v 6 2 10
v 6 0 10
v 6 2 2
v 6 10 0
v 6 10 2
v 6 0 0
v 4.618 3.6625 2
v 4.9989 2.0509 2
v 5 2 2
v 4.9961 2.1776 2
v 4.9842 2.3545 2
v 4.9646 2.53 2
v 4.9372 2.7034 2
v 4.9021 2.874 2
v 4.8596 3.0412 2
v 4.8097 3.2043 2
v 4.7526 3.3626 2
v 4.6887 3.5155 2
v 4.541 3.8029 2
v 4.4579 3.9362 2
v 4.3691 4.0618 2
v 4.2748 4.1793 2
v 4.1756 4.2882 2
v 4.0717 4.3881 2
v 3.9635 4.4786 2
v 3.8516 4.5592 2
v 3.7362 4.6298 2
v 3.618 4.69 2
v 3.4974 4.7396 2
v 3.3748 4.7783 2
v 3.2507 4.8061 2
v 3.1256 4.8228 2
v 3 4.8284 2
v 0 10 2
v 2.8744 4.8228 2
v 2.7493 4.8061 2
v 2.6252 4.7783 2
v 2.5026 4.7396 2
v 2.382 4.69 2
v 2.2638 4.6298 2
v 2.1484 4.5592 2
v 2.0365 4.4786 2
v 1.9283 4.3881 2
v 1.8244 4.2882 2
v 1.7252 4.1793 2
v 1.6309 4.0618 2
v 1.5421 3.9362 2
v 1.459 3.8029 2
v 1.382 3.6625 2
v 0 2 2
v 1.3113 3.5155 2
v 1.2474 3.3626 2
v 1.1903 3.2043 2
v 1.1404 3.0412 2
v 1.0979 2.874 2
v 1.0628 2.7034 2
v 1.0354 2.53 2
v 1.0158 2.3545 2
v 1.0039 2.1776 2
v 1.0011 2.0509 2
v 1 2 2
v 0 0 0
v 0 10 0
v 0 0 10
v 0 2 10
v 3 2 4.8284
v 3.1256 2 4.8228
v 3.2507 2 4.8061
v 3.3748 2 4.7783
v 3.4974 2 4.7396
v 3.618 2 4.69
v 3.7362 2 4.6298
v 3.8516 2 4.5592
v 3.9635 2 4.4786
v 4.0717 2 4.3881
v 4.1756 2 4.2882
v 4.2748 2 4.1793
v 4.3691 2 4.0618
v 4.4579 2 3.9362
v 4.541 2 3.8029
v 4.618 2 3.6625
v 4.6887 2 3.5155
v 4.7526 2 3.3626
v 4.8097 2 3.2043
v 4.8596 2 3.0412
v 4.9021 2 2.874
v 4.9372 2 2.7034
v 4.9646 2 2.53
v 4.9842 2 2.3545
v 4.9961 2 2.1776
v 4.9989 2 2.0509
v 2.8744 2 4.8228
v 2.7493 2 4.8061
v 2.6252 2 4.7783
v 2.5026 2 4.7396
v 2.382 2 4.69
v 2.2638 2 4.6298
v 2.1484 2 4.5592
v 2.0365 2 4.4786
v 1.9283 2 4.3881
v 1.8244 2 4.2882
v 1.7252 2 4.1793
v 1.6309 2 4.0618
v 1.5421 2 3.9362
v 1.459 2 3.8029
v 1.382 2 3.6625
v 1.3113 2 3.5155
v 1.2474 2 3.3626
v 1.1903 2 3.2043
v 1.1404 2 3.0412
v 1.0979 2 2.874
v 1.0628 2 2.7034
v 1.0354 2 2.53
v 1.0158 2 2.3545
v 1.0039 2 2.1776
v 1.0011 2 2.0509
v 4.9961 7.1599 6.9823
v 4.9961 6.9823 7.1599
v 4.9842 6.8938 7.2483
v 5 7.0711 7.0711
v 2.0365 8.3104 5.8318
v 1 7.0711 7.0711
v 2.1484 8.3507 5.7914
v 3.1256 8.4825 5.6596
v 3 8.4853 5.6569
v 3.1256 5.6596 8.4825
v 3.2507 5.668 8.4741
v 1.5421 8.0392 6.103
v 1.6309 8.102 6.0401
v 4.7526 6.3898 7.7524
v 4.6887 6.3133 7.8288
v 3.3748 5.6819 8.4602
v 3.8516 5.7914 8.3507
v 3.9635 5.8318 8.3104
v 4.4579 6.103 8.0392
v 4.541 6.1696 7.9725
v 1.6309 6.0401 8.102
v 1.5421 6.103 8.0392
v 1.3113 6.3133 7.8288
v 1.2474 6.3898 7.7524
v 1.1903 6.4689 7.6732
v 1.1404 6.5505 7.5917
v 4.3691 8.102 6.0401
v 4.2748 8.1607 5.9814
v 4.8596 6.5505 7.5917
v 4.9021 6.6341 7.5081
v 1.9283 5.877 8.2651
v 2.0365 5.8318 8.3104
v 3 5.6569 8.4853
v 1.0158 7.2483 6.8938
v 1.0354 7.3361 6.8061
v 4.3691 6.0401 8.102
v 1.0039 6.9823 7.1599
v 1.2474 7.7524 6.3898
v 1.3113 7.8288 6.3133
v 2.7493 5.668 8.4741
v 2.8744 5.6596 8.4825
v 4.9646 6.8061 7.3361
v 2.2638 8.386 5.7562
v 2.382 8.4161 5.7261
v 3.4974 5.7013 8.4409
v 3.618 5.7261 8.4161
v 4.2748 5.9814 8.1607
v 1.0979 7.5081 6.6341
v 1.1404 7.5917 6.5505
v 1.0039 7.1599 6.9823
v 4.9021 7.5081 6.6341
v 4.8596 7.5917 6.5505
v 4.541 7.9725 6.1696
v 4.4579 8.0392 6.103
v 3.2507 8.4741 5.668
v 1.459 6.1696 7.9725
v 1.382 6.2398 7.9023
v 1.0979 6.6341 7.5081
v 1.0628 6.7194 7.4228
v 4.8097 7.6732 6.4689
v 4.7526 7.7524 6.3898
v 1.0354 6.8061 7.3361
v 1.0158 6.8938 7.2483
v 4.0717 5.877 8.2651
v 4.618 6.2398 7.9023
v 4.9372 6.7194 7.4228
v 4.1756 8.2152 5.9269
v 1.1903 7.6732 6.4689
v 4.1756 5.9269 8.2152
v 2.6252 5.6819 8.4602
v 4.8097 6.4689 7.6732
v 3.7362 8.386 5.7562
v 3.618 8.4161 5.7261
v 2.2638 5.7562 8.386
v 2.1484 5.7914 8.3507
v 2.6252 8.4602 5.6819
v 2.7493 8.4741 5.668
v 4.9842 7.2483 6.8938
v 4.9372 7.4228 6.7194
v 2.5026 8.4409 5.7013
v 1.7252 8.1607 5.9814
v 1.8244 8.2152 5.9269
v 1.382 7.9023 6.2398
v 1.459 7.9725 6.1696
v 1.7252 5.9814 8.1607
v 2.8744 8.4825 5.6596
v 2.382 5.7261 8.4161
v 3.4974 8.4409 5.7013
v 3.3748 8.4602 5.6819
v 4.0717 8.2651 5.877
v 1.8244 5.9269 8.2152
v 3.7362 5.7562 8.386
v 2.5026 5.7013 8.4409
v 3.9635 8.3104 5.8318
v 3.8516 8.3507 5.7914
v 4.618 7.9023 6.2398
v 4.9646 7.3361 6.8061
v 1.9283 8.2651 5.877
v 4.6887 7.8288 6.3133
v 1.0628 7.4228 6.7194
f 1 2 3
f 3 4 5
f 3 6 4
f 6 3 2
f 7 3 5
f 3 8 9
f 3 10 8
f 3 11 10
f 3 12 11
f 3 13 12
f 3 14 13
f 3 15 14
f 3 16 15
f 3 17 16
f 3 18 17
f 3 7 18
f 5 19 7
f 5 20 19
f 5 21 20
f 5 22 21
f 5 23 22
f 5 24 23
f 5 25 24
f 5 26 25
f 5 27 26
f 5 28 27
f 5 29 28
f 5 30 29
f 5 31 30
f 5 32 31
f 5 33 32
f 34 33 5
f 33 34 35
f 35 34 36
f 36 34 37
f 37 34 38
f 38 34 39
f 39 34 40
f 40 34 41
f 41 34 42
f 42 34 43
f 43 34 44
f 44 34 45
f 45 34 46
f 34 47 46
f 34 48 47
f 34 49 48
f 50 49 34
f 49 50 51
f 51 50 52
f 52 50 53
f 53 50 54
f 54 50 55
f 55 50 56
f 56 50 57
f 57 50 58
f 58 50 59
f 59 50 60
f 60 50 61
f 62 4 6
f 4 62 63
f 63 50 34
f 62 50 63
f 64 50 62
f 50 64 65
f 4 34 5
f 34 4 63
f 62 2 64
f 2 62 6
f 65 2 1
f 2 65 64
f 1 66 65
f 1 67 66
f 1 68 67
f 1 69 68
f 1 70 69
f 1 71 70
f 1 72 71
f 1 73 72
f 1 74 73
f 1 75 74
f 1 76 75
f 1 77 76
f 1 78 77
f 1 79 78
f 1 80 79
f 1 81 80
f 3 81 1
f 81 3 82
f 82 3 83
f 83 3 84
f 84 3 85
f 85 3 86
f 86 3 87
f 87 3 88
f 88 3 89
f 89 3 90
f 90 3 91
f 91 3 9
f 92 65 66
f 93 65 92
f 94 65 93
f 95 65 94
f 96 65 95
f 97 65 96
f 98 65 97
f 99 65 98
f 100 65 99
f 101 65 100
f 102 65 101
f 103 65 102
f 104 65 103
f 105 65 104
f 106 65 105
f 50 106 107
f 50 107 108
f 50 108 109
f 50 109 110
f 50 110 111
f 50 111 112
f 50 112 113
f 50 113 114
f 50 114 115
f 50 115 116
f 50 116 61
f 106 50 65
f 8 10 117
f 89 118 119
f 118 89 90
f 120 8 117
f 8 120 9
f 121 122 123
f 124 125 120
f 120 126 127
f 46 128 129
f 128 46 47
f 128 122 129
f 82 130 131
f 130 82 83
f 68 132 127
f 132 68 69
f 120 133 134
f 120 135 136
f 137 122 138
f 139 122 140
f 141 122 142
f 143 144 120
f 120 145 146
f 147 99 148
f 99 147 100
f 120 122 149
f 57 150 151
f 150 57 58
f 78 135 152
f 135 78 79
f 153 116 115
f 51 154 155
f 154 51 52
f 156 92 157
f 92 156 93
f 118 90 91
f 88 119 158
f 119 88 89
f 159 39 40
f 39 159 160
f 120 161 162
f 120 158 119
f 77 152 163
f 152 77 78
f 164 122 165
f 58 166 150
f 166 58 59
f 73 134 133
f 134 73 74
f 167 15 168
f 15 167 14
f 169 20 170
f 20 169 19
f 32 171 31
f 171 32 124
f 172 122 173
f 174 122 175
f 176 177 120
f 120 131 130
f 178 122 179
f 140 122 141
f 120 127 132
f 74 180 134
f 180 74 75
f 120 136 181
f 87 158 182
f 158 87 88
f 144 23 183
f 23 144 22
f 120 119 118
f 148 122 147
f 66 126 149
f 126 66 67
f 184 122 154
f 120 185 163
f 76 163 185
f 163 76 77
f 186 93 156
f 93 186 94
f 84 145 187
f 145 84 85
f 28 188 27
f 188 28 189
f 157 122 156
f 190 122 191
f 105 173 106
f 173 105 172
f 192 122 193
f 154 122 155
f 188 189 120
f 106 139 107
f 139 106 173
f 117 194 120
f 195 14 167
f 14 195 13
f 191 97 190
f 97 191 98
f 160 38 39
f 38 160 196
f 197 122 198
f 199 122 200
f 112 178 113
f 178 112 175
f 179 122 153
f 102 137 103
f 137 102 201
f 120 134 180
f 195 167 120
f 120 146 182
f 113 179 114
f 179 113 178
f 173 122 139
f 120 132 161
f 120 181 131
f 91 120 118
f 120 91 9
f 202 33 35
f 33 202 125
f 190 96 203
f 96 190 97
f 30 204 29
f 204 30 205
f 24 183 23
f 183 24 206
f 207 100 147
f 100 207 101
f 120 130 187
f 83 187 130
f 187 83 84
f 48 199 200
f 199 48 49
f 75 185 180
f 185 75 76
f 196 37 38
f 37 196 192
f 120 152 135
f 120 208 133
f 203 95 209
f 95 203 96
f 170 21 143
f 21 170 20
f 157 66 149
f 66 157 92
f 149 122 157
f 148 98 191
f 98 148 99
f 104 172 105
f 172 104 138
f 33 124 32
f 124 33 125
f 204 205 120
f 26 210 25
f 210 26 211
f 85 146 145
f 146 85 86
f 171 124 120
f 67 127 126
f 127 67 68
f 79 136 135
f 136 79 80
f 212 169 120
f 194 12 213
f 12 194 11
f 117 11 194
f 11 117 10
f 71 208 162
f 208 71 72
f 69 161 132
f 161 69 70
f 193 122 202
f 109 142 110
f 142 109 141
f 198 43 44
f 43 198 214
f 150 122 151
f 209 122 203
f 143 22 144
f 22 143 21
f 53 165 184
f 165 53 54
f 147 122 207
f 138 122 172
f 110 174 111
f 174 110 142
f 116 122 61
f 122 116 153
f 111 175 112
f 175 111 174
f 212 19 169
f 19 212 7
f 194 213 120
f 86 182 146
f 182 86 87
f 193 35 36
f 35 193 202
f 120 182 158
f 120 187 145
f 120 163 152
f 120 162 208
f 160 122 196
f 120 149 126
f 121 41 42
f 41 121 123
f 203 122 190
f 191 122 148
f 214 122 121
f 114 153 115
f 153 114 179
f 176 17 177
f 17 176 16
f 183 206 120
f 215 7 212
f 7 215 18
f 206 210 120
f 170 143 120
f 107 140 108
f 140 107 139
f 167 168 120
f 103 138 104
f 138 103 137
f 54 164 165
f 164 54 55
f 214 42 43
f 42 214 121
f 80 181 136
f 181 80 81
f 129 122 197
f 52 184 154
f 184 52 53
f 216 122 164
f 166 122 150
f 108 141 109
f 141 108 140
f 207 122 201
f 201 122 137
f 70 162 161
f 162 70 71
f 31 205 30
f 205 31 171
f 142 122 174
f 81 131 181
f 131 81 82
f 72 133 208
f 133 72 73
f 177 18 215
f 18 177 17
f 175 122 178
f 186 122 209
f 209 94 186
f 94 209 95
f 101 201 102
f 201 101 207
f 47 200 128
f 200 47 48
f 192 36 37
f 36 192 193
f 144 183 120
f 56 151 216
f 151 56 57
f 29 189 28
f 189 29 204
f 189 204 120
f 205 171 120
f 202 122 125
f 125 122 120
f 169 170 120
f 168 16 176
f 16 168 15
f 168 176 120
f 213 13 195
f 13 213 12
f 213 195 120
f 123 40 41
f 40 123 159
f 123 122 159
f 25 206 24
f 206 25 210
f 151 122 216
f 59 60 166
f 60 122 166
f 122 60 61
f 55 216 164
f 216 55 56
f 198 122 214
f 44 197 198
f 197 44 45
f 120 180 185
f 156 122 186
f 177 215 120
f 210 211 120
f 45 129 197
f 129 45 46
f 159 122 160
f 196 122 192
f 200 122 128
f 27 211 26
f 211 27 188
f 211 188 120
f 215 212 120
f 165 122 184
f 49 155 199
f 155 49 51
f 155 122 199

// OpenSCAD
difference(){
	union(){


        translate([0,0,0]){
           cube([6,10,2], center=false);
        }        
        translate([0,0,0]){
           cube([6,2,10], center=false);
        }        


        translate([3,0,0]){
            rotate([-45,0,0]){
               cylinder(h=10, r=2, $fn=100, center=false);
            }
        }

        
	}
	union() {
        translate([0,0,-2]){
           cube([6,10,2], center=false);
        }        
        translate([0,-2,0]){
           cube([6,2,10], center=false);
        }        


	}
}
